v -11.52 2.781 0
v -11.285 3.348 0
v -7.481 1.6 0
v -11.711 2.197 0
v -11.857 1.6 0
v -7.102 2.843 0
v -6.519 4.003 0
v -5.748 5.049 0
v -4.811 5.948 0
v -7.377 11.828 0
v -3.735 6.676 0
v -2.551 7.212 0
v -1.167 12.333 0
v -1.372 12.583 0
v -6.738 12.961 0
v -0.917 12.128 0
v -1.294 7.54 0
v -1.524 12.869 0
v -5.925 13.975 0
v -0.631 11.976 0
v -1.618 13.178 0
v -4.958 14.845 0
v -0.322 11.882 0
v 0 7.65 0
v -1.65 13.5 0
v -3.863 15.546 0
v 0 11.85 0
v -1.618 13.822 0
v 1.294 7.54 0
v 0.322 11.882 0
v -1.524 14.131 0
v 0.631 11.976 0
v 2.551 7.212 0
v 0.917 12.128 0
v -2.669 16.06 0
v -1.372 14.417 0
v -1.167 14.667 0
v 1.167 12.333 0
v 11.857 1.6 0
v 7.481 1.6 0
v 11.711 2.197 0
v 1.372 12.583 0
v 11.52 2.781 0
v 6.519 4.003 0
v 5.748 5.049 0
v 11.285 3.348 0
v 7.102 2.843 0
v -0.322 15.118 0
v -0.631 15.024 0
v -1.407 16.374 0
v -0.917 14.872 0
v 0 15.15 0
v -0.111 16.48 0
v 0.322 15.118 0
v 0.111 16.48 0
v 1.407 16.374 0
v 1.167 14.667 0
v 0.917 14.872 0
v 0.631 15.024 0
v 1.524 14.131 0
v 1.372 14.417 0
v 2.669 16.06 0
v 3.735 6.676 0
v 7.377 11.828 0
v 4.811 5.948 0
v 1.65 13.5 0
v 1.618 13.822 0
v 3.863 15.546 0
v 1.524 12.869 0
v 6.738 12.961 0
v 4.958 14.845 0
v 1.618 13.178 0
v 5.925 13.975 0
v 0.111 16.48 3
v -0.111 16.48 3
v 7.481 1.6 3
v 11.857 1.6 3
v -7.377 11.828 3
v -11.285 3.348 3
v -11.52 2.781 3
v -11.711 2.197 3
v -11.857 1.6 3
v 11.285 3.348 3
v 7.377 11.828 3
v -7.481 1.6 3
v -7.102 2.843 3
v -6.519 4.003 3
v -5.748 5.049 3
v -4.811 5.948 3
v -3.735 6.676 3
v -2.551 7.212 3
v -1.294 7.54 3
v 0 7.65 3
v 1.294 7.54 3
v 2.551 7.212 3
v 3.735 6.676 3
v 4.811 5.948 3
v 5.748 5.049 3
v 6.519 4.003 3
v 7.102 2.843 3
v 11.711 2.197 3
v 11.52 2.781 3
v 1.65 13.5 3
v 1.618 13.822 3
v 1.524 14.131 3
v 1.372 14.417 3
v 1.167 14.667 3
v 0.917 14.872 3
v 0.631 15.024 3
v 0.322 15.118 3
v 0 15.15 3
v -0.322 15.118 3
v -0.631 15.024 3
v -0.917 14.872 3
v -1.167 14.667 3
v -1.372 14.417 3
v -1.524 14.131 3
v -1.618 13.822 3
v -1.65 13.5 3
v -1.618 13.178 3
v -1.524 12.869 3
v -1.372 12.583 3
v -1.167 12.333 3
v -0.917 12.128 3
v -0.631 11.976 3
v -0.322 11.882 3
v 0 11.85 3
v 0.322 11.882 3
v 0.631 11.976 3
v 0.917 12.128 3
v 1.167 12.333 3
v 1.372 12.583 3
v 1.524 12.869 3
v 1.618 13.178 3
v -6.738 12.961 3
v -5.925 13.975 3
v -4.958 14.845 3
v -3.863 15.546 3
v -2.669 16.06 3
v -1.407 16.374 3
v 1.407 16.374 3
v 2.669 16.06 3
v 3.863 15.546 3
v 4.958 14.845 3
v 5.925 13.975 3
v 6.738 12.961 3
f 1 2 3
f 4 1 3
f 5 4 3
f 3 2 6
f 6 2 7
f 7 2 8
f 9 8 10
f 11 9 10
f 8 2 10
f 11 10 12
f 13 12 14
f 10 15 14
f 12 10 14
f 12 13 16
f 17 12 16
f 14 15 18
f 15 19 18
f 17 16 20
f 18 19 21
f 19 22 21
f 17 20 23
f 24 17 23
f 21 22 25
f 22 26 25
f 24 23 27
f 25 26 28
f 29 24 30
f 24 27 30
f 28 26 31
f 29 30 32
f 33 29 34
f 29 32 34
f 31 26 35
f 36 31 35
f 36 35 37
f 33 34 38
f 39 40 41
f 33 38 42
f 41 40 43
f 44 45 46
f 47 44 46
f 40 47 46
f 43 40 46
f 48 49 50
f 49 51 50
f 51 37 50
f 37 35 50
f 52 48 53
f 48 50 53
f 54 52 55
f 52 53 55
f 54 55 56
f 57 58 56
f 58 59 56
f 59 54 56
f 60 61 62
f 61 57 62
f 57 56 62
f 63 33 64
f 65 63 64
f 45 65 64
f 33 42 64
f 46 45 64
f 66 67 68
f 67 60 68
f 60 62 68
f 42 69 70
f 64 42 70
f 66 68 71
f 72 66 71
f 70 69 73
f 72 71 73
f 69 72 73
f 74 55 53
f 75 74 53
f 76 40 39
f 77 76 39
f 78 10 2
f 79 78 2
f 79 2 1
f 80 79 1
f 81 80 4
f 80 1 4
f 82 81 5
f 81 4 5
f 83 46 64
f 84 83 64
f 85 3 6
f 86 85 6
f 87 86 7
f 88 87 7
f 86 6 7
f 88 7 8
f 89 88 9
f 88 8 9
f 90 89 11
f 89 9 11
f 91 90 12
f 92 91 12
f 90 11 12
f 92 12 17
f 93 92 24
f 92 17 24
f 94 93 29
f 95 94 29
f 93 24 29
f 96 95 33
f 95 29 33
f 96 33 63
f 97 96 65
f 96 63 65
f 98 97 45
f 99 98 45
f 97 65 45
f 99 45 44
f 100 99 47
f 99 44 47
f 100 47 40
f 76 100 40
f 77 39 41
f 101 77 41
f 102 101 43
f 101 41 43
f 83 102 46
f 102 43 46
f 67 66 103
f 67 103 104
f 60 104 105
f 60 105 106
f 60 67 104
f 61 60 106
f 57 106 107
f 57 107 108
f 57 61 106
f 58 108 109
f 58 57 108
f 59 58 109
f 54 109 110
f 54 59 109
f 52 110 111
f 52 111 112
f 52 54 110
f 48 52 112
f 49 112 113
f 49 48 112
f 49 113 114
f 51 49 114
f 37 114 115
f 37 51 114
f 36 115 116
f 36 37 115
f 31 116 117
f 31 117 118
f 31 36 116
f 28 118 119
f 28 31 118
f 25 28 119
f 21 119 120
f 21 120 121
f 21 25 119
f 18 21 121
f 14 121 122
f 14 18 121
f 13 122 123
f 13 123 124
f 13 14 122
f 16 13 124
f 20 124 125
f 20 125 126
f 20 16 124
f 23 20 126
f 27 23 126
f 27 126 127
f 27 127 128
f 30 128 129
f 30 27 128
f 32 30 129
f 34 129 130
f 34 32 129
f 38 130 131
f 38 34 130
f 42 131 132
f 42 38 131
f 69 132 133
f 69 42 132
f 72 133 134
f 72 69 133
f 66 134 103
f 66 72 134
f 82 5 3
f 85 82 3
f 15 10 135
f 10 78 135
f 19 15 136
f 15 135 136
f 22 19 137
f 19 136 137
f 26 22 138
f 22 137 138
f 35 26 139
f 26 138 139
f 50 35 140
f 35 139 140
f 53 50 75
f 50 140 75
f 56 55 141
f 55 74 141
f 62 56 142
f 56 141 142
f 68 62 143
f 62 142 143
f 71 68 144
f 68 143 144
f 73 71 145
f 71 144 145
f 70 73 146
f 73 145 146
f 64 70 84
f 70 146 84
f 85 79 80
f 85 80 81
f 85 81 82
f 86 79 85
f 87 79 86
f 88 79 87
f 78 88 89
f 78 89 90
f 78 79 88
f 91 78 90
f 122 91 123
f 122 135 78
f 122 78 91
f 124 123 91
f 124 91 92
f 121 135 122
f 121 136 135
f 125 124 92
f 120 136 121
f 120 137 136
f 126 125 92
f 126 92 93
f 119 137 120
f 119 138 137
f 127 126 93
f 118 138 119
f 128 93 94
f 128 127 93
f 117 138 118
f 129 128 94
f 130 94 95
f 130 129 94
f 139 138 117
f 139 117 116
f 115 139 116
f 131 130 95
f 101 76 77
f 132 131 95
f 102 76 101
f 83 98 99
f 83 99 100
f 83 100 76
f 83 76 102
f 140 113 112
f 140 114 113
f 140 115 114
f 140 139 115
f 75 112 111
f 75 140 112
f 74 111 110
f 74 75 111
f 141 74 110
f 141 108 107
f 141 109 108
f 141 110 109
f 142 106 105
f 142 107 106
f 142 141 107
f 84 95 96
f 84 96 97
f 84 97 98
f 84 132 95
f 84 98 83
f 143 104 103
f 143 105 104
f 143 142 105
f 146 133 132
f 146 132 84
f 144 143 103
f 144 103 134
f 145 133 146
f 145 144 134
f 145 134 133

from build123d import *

# Parameters (mm, degrees)
ESBO_O1_R                = 1.65
RESSALTO_EXTRUS_O1_DEPTH = 3
FILETE1_R                = 8


with BuildPart() as part:
    # Esboço1 → Ressalto-extrusão1 (new body)
    with BuildSketch(Plane.XY):
        with BuildLine():
            Line((-5.233177242, 16.48), (-11.2845681, 3.348148148))
            ThreePointArc((-11.2845681, 3.348148148), (-11.621333239, 2.490590121), (-11.85726917, 1.6))
            Line((-11.85726917, 1.6), (-7.48080878, 1.6))
            ThreePointArc((-7.48080878, 1.6), (0, 7.65), (7.48080878, 1.6))
            Line((7.48080878, 1.6), (11.85726917, 1.6))
            ThreePointArc((11.85726917, 1.6), (11.621333239, 2.490590121), (11.2845681, 3.348148148))
            Line((11.2845681, 3.348148148), (5.233177242, 16.48))
            Line((5.233177242, 16.48), (-5.233177242, 16.48))
        make_face()
        with Locations((0, 13.5)):
            Circle(ESBO_O1_R, mode=Mode.SUBTRACT)
    extrude(amount=RESSALTO_EXTRUS_O1_DEPTH)

    # Filete1
    filete1_edges = [part.edges().sort_by_distance(p)[0] for p in [
        (-5.233177242, 16.48, 1.5),
        (5.233177242, 16.48, 1.5),
    ]]
    fillet(filete1_edges, radius=FILETE1_R)


solid = part.part
